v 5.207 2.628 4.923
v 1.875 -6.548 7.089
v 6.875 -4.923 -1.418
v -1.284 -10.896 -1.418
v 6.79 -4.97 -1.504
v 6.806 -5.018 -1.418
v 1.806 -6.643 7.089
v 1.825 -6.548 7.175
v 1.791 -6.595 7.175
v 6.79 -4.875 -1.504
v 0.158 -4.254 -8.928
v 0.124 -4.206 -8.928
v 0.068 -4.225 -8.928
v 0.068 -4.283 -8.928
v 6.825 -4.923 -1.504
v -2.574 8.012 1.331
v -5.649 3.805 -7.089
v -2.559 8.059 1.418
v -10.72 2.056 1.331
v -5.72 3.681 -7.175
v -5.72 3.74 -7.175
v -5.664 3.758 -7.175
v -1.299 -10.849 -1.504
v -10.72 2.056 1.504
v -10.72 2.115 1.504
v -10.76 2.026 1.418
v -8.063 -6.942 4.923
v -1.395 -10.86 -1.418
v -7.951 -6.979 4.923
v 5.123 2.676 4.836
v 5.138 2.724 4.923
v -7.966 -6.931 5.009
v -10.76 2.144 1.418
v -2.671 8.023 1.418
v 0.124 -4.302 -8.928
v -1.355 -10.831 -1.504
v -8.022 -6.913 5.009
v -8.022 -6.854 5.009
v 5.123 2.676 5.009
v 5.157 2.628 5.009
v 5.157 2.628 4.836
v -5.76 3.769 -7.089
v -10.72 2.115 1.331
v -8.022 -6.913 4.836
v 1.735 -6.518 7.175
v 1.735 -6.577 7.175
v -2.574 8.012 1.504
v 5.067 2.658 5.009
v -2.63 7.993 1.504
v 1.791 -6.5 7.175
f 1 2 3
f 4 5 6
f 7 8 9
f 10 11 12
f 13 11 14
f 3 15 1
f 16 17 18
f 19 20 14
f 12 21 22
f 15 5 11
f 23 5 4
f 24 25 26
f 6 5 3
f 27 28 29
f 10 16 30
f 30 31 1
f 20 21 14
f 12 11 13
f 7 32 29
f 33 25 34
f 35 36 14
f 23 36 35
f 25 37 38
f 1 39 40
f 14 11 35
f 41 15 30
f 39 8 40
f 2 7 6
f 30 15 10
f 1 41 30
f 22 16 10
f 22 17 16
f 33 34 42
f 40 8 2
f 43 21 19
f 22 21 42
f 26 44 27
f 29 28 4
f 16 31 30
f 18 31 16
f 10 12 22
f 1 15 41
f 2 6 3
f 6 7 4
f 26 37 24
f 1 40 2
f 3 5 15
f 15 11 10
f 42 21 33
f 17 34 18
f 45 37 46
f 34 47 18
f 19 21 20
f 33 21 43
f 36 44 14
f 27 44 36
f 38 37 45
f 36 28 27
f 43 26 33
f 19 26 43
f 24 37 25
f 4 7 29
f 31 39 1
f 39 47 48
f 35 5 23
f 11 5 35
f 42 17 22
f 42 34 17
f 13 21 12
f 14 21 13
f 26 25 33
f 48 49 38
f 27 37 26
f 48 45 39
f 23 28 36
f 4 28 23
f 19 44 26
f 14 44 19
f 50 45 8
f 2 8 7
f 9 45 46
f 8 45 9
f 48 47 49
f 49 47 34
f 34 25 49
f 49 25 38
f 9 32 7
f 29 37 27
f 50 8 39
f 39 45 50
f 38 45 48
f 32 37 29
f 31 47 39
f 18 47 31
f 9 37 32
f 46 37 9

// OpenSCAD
// Auto-generated OpenSCAD file

    inner_points = 10*[[-0.5679521834680924, 0.3710392408495472, -0.708875678733561], [0.6774959295154908, -0.4922625333758151, -0.14177512924090818], [-1.0679348487285032, 0.2085260495957944, 0.14177512924090818], [0.17751326425508, -0.6547757246295679, 0.708875678733561], [0.010822126776322105, -0.4253965348253418, -0.8841193748434077], [-0.7981668194007837, -0.6883484018941259, 0.4922625450168436], [-0.2589805762752483, 0.796397621522542, 0.14177512737898157], [0.5107486887730253, 0.2628477825031803, 0.49226254200418296], [-0.13145834293776412, -1.0801341053025628, -0.14177512737898157]];

    outer_points = 10*[[-0.8507501659543638, -0.00016416400980563553, 0.42512659922224816], [0.0002222331138788114, 0.00016416400980563553, -0.9510564761622176], [-0.0002222331138788114, -0.00016416400980563553, 0.9510564761622176], [0.8507501659543638, 0.00016416400980563553, -0.42512659922224816], [-0.6880381915718803, -0.49999998970608384, -0.42557250195458624], [0.6881449121452123, -0.49999998970608384, 0.4253999146333339], [-0.26305127181358173, 0.8089155187812519, 0.4254035837408861], [0.2628785942986316, 0.8091184366568306, -0.4251243315890725], [0.26305127181358173, -0.8089155187812519, -0.4254035837408861]];

    // Convex hull for inner set (I)
    module inner_hull() {
        hull() {
            for (p = inner_points) {
                translate(p) sphere(r=0.1);
            }
        }
    }

    // Convex hull for outer set (O) minus inner hull (O \ I)
    module outer_minus_inner() {
        difference() {
            hull() {
                for (p = outer_points) {
                    translate(p) sphere(r=0.1);
                }
            }
            inner_hull(); // Subtract inner hull
        }
    }

    // Convex hull for outer set (O) minus all translated inner hulls
    module outer_minus_AllTranslationInner() {
        difference() {
            hull() {
                for (p = outer_points) {
                    translate(p) sphere(r=0.1);
                }
            }
            hull() {
                translate([0,0,50]) inner_hull();
                translate([0,0,-50]) inner_hull();
            }; // Subtract translated inner hulls
        }
    }

    // Difference between outer_minus_inner and outer_minus_AllTranslationInner
    module outer_minus_inner_diff() {
        difference() {
            // Outer minus inner
            difference() {
                hull() {
                    for (p = outer_points) {
                        translate(p) sphere(r=0.1);
                    }
                }
                inner_hull();
            }

            // Subtract Outer minus AllTranslationInner
            difference() {
                hull() {
                    for (p = outer_points) {
                        translate(p) sphere(r=0.1);
                    }
                }
                hull() {
                    translate([0,0,50]) inner_hull();
                    translate([0,0,-50]) inner_hull();
                };
            }
        }
    }

    // Rendering all with colors applied
    color([1, 0, 0, 0.5]) inner_hull(); // Transparent red
    
